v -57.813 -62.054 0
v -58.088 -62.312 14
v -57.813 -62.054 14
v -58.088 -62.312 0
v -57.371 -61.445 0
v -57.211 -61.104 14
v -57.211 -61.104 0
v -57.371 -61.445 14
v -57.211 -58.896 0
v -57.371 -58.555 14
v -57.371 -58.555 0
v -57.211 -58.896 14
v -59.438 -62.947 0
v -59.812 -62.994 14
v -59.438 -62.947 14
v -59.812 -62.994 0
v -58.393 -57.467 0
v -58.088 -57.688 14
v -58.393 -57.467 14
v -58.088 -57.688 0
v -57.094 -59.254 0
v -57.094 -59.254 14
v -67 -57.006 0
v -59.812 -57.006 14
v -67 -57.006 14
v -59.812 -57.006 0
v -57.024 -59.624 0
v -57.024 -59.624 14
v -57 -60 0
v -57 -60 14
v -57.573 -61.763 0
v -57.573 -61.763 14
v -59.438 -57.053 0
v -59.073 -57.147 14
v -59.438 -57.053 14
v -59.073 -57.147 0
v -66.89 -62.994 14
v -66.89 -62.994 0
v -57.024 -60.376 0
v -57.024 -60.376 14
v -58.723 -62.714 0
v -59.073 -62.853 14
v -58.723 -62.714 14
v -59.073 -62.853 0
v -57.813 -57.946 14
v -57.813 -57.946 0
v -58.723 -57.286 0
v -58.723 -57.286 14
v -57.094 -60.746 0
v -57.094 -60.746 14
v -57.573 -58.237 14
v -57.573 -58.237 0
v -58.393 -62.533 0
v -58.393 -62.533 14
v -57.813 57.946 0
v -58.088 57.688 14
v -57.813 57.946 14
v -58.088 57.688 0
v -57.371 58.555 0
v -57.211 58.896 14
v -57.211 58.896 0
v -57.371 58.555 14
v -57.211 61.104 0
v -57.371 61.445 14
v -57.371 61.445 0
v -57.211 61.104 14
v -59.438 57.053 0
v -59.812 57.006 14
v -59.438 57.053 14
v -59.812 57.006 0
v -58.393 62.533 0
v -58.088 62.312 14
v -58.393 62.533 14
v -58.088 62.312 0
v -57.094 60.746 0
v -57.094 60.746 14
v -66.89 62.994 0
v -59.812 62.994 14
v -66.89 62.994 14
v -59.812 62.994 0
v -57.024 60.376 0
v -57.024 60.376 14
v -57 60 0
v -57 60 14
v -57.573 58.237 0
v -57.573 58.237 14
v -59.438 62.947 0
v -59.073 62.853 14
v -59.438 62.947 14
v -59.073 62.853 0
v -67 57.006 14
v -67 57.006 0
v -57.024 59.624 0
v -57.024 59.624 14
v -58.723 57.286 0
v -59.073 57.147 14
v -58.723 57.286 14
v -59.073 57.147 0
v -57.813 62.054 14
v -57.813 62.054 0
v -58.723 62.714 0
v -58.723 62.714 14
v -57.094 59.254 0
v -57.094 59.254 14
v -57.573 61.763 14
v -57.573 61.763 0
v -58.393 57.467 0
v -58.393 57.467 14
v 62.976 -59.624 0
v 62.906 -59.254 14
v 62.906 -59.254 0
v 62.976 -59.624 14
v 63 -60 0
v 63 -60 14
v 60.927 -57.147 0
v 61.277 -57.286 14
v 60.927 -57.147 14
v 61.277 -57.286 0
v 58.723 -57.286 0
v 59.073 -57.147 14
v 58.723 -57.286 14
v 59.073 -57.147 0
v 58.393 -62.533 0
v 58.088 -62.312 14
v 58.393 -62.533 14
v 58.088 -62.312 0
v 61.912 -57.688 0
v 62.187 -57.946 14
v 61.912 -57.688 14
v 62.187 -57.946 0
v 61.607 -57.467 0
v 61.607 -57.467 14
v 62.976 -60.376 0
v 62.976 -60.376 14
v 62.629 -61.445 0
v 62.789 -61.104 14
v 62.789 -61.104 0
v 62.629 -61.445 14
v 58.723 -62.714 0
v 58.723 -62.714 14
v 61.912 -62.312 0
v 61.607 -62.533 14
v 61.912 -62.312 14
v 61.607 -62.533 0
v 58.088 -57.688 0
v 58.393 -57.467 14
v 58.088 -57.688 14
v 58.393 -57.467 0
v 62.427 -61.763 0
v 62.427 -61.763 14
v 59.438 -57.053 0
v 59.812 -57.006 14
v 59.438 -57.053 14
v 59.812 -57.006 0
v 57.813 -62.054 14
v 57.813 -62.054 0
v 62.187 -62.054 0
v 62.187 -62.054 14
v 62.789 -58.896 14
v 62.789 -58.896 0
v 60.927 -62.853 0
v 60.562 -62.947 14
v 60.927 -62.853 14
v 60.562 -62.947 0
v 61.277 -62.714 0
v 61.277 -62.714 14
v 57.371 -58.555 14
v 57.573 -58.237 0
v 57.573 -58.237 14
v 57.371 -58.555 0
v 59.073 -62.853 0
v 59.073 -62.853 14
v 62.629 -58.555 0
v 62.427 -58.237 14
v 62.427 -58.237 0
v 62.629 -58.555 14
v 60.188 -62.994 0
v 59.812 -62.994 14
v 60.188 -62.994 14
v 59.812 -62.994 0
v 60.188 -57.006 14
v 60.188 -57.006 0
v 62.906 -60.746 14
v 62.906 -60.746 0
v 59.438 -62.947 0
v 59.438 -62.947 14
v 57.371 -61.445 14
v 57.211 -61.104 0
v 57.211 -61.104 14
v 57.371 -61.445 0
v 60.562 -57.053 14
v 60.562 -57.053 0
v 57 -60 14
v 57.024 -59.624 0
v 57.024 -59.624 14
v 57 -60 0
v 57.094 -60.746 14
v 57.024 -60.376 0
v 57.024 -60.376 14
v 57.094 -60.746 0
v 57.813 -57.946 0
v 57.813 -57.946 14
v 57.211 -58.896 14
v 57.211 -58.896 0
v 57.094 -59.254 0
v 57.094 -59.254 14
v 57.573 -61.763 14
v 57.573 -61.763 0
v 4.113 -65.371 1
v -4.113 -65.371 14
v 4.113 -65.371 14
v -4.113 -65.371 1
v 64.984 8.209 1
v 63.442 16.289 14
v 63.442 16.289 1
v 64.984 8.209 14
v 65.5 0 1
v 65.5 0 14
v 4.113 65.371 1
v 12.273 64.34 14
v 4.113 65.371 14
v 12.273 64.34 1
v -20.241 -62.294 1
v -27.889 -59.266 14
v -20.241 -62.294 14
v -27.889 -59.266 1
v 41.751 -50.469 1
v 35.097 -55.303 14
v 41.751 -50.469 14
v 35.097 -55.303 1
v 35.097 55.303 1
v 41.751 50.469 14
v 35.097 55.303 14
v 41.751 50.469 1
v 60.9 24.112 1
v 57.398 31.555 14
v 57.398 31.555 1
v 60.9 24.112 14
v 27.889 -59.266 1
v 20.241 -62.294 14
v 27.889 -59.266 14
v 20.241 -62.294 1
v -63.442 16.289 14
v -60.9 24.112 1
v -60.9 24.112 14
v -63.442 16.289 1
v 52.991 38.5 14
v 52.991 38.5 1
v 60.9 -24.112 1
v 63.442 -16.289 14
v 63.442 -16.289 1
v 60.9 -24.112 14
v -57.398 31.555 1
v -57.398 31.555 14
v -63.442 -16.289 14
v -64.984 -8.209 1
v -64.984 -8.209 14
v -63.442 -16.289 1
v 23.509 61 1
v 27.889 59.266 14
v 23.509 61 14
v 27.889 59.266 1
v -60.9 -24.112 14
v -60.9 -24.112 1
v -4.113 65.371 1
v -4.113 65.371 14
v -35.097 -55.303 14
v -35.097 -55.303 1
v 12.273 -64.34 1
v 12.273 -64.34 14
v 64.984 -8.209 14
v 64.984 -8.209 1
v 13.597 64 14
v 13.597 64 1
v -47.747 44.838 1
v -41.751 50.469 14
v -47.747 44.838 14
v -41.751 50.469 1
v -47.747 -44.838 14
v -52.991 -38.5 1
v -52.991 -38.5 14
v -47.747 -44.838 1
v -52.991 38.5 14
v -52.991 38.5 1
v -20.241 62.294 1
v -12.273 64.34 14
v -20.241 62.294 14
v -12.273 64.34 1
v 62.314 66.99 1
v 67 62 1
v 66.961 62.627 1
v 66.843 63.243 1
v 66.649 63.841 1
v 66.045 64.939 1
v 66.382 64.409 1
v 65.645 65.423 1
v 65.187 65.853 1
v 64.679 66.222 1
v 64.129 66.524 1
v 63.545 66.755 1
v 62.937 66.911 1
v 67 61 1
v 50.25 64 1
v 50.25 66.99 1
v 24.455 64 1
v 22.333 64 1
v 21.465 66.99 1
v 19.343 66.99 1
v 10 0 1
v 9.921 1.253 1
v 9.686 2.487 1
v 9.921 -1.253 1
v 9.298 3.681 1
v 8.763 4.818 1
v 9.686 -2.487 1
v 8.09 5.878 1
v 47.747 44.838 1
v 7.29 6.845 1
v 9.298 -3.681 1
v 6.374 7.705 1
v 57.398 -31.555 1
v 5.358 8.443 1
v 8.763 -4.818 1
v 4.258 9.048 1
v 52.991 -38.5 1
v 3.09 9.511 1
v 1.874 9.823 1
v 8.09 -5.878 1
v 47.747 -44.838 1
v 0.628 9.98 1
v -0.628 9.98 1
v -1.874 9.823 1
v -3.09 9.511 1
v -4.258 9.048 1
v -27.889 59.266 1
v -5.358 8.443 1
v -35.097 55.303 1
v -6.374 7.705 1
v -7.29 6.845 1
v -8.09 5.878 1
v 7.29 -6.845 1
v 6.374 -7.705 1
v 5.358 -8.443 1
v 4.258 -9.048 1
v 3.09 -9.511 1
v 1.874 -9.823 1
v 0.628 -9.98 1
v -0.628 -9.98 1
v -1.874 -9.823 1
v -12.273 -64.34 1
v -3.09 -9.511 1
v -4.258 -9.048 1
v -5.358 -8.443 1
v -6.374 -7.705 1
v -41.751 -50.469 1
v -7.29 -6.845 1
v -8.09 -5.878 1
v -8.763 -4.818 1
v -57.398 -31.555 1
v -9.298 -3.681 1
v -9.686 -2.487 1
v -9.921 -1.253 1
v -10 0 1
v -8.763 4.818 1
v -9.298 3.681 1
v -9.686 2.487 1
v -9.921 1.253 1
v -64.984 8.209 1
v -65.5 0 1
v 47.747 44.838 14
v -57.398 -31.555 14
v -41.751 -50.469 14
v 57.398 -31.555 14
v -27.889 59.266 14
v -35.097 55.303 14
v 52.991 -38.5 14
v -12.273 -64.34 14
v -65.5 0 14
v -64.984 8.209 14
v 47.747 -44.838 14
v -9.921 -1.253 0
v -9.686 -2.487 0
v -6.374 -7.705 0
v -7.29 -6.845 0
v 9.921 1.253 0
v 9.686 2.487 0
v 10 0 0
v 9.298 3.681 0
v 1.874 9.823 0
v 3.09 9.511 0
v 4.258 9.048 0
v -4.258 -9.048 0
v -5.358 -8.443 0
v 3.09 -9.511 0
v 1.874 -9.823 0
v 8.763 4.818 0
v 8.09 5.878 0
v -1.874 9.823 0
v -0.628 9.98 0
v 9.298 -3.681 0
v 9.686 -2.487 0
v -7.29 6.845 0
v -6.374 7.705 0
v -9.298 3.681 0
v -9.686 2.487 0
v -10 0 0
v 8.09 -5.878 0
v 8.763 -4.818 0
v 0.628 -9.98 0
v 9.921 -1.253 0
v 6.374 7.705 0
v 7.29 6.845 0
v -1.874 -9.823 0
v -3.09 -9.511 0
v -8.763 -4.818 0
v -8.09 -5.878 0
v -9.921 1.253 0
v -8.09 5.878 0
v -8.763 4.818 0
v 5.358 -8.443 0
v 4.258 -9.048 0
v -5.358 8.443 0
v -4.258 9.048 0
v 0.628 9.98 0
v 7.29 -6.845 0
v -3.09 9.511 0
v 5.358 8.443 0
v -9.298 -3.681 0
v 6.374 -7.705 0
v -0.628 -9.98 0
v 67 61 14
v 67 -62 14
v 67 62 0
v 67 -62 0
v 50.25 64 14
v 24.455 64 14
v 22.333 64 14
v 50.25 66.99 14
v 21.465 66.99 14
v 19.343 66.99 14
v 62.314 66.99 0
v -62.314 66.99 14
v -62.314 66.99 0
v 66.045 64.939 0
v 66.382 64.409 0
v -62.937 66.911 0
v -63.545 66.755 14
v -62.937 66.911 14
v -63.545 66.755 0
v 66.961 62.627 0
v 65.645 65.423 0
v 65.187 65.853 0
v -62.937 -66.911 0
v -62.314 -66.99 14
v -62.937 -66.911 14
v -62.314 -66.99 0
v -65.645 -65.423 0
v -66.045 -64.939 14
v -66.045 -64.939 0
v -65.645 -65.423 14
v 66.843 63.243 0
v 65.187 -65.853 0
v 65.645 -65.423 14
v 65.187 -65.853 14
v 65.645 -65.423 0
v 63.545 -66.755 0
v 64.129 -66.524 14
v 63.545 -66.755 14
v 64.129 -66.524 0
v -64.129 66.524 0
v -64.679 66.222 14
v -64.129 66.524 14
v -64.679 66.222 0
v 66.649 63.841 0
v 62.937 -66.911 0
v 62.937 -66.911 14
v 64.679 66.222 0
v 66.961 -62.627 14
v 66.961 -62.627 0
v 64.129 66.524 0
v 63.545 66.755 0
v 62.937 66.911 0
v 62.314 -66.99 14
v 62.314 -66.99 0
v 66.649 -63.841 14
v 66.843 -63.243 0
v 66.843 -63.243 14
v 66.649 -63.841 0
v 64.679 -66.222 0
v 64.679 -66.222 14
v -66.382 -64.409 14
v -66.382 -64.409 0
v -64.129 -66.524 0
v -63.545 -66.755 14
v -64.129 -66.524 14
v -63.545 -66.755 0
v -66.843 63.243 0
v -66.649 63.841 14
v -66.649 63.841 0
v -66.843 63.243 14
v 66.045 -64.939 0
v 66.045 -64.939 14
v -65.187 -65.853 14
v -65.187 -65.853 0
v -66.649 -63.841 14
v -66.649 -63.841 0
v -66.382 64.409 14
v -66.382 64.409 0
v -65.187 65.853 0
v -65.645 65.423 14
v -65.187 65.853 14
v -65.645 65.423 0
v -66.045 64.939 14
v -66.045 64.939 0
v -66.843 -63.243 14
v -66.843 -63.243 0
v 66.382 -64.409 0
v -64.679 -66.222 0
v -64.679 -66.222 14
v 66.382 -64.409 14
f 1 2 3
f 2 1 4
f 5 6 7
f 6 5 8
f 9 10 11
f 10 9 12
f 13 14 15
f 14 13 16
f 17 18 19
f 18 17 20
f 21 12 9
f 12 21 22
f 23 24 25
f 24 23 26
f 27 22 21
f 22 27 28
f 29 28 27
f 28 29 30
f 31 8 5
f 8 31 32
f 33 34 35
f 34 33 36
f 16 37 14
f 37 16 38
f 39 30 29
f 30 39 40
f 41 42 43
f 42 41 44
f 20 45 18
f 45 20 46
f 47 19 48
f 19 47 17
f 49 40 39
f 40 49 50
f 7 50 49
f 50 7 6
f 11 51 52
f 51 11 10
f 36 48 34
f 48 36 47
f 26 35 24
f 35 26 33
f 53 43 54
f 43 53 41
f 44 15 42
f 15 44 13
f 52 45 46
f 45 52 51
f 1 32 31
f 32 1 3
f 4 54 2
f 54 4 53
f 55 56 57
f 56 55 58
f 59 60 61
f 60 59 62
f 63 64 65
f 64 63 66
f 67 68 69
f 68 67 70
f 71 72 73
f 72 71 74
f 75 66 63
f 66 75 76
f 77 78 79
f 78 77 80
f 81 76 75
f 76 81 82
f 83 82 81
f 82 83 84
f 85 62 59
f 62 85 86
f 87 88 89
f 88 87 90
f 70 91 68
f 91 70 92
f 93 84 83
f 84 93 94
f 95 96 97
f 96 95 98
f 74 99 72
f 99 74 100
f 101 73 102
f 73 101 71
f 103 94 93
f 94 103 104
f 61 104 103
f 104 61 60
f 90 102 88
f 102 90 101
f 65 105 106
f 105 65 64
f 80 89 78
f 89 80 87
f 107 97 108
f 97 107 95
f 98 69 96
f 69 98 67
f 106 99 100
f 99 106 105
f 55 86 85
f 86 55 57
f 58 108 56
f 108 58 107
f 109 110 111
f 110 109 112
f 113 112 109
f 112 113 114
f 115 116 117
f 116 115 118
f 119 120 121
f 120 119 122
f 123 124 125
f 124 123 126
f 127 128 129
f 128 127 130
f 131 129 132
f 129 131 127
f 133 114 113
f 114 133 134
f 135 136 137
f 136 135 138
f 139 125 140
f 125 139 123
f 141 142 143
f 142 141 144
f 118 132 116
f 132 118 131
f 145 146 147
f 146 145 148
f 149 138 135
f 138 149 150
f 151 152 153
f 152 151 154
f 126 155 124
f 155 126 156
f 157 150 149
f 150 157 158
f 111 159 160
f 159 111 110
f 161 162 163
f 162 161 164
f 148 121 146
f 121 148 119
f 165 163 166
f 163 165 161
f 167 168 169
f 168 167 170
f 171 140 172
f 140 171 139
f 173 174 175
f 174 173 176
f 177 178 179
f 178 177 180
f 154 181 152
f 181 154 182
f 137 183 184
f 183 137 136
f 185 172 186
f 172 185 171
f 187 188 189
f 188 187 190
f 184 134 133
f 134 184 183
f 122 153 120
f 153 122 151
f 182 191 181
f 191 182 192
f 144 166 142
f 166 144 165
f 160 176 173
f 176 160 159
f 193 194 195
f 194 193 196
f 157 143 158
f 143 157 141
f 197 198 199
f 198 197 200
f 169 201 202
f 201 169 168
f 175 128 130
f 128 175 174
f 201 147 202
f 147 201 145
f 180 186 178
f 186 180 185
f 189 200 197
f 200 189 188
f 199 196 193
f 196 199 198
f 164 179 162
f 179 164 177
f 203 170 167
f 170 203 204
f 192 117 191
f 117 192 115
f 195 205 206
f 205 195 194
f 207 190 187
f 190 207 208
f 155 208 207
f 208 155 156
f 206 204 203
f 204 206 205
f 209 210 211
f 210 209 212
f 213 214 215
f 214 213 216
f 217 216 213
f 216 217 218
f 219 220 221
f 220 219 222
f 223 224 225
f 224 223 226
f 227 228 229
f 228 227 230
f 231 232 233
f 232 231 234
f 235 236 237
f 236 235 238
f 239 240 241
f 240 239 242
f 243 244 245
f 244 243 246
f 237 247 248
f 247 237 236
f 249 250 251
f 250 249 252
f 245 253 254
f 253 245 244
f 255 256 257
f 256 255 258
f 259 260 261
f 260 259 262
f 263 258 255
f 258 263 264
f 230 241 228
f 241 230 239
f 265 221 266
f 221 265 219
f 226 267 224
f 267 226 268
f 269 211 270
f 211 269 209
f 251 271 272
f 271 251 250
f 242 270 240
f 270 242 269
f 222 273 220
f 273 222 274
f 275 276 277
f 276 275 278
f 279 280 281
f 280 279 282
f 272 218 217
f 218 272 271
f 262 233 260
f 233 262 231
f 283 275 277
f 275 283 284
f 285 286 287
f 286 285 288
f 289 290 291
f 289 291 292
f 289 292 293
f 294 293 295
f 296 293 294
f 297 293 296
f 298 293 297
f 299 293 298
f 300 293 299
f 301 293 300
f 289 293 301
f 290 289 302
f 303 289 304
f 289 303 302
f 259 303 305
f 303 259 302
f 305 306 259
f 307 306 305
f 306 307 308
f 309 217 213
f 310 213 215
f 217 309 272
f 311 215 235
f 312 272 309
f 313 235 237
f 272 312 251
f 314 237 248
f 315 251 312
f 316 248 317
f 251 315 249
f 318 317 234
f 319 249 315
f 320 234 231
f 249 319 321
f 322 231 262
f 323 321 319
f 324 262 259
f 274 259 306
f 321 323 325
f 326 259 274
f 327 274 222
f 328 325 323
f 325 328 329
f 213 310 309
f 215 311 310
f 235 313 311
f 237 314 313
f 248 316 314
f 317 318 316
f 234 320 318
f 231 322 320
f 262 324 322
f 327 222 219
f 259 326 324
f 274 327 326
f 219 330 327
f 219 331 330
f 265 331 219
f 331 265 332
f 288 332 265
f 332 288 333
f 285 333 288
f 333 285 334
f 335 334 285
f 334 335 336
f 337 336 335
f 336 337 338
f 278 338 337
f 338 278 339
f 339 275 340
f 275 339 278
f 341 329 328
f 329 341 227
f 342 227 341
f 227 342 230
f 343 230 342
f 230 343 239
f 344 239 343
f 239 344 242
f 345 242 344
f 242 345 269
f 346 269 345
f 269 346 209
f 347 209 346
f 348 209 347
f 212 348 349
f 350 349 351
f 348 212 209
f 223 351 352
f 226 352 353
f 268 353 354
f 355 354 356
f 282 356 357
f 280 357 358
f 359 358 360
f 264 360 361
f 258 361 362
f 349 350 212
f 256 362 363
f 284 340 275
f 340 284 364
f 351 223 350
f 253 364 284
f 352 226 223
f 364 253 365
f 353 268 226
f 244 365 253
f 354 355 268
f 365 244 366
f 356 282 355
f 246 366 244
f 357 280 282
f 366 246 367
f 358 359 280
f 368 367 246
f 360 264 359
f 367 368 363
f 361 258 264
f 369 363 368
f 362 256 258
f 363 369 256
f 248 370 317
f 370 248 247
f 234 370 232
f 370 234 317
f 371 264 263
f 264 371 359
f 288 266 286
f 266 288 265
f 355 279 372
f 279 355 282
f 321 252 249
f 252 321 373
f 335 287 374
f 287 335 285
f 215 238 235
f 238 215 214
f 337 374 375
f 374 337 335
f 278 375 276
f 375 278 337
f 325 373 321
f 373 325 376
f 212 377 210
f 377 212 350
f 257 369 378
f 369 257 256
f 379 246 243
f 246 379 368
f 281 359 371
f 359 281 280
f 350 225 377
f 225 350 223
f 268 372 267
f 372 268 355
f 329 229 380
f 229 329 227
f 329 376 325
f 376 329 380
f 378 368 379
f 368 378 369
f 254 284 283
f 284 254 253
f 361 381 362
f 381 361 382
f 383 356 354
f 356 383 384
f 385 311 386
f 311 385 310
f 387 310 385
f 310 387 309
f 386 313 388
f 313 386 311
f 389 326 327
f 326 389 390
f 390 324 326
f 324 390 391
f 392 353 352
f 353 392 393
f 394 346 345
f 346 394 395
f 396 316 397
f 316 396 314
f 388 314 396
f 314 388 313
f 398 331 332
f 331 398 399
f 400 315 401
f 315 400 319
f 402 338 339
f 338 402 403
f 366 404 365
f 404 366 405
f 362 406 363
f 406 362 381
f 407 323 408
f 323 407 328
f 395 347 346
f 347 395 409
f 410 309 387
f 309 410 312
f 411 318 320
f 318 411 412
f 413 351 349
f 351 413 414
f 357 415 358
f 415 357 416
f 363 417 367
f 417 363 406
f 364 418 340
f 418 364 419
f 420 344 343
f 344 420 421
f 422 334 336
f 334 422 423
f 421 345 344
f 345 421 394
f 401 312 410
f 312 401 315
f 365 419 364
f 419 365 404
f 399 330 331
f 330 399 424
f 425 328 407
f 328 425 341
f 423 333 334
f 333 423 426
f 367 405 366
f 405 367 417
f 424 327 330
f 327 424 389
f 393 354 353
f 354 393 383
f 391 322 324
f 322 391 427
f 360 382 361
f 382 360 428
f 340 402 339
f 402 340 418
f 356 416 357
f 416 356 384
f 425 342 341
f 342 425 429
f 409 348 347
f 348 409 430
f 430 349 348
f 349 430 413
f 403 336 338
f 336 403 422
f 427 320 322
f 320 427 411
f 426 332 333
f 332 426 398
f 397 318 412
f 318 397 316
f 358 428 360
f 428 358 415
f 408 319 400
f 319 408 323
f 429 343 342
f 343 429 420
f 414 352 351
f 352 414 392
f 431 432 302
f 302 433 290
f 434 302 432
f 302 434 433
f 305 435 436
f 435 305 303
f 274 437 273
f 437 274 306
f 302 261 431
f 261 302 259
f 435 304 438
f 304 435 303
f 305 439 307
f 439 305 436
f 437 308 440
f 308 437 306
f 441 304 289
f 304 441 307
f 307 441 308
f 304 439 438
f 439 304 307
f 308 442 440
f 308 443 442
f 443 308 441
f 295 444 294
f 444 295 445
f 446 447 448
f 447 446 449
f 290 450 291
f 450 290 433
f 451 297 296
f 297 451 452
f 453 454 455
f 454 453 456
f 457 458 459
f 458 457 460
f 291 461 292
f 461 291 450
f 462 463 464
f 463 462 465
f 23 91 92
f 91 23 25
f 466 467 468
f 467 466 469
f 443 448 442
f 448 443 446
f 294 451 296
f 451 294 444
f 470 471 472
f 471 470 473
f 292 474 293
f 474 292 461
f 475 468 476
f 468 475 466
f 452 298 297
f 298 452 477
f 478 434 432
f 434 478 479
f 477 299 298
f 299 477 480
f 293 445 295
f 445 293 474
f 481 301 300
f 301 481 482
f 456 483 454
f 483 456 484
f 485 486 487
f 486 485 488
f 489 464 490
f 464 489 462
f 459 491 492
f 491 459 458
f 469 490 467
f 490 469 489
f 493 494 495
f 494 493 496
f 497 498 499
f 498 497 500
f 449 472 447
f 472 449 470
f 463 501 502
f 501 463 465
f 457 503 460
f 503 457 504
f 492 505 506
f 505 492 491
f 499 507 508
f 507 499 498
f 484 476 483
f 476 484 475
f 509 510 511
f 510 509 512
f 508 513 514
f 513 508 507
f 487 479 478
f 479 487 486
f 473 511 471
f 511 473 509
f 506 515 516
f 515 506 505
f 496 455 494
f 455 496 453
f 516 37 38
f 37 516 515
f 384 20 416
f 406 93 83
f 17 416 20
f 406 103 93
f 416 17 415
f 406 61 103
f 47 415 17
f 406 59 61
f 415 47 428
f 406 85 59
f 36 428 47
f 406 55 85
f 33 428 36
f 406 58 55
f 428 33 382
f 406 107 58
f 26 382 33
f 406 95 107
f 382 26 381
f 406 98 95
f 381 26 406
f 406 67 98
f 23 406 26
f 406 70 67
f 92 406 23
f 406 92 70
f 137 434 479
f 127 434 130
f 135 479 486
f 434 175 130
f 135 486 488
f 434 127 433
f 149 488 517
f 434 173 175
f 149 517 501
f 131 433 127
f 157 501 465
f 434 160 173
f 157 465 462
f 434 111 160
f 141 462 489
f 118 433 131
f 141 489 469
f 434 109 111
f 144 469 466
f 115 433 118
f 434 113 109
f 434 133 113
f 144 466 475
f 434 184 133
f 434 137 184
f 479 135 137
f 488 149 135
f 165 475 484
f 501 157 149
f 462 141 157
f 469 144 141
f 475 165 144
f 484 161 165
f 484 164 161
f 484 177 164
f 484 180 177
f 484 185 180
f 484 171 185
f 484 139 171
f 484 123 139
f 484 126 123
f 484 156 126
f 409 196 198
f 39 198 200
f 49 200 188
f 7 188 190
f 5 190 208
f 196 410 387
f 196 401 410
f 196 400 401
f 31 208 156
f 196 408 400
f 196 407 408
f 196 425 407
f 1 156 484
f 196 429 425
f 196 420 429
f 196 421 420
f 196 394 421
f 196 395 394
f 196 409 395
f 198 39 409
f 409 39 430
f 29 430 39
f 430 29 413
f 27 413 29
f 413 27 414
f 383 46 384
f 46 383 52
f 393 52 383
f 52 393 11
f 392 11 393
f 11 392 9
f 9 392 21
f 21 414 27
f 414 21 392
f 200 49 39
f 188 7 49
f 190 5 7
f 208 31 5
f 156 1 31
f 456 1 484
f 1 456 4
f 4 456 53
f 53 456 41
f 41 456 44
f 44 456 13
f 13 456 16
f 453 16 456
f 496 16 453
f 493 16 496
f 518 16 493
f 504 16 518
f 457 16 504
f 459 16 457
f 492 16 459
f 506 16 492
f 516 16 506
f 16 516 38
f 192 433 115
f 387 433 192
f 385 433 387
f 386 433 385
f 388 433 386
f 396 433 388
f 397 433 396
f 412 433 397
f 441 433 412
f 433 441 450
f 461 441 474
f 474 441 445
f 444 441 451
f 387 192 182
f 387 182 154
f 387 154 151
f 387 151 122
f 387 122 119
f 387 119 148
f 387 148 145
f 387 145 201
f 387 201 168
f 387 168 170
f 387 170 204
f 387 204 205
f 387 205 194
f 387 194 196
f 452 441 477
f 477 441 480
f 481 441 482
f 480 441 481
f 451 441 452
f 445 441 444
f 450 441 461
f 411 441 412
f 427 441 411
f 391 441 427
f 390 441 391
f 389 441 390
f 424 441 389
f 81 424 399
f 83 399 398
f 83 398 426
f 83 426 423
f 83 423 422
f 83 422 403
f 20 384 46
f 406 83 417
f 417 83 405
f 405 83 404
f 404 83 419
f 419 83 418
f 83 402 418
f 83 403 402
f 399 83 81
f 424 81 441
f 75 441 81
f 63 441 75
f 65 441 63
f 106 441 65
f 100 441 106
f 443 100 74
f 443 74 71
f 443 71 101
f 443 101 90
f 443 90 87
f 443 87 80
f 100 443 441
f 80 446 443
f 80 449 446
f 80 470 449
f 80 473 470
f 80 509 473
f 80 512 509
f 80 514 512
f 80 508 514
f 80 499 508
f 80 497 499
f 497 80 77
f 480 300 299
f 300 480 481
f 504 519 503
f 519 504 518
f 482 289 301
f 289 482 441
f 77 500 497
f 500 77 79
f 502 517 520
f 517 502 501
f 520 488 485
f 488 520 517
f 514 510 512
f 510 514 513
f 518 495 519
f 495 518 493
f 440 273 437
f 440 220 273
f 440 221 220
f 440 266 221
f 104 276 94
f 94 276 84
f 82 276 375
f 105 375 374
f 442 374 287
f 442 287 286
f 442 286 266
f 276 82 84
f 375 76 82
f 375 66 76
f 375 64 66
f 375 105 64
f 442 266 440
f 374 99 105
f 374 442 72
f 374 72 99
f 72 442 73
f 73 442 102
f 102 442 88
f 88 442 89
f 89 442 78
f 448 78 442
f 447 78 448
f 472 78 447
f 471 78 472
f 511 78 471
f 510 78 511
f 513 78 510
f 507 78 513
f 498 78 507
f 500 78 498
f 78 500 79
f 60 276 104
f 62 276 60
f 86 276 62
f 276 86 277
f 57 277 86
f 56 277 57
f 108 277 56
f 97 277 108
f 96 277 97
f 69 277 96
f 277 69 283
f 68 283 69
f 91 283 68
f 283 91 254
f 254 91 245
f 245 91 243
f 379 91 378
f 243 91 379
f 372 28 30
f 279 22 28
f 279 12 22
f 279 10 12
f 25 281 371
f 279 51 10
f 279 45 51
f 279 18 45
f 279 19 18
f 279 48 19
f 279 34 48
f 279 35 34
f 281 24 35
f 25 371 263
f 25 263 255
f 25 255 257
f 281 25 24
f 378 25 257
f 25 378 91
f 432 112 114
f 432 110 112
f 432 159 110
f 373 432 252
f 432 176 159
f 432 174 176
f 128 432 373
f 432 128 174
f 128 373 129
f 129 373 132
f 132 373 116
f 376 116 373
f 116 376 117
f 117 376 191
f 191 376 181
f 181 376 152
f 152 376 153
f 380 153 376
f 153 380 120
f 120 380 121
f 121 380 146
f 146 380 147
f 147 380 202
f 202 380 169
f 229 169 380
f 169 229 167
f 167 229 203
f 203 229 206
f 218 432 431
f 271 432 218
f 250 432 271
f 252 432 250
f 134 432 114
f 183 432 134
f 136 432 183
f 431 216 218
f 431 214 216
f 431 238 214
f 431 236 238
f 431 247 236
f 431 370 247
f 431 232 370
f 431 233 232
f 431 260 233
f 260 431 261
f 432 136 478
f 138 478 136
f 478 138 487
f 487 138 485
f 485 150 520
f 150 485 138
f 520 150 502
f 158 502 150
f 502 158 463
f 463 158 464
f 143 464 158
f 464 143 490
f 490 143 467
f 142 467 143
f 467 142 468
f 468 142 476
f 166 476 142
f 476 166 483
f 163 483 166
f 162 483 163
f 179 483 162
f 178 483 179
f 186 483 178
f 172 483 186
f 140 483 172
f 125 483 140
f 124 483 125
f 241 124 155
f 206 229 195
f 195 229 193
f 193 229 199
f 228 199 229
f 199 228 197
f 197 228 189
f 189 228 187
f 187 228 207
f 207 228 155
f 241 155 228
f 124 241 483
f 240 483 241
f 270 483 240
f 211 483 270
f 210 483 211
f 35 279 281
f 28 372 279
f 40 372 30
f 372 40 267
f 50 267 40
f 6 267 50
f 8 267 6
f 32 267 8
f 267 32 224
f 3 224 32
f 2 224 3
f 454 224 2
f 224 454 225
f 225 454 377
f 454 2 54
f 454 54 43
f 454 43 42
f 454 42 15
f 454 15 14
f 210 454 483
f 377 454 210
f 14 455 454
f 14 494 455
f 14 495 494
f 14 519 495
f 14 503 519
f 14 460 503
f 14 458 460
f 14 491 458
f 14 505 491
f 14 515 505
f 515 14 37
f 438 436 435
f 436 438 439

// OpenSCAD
$fn = 50;


difference() {
	union() {
		translate(v = [0, 0, 0]) {
			rotate(a = [0, 0, 0]) {
				hull() {
					translate(v = [-62.0000000000, 62.0000000000, 0]) {
						rotate(a = [0, 0, 0]) {
							translate(v = [0, 0, 0]) {
								rotate(a = [0, 0, 0]) {
									cylinder(h = 14, r = 5);
								}
							}
						}
					}
					translate(v = [62.0000000000, 62.0000000000, 0]) {
						rotate(a = [0, 0, 0]) {
							translate(v = [0, 0, 0]) {
								rotate(a = [0, 0, 0]) {
									cylinder(h = 14, r = 5);
								}
							}
						}
					}
					translate(v = [-62.0000000000, -62.0000000000, 0]) {
						rotate(a = [0, 0, 0]) {
							translate(v = [0, 0, 0]) {
								rotate(a = [0, 0, 0]) {
									cylinder(h = 14, r = 5);
								}
							}
						}
					}
					translate(v = [62.0000000000, -62.0000000000, 0]) {
						rotate(a = [0, 0, 0]) {
							translate(v = [0, 0, 0]) {
								rotate(a = [0, 0, 0]) {
									cylinder(h = 14, r = 5);
								}
							}
						}
					}
				}
			}
		}
	}
	union() {
		translate(v = [-67.5000000000, -60.0000000000, -125]) {
			rotate(a = [0, 0, 0]) {
				hull() {
					translate(v = [7.5000000000, 0, 0]) {
						rotate(a = [0, 0, 0]) {
							translate(v = [0, 0, 0]) {
								rotate(a = [0, 0, 0]) {
									cylinder(h = 250, r = 3.0000000000);
								}
							}
						}
					}
					translate(v = [-7.5000000000, 0, 0]) {
						rotate(a = [0, 0, 0]) {
							translate(v = [0, 0, 0]) {
								rotate(a = [0, 0, 0]) {
									cylinder(h = 250, r = 3.0000000000);
								}
							}
						}
					}
				}
			}
		}
		translate(v = [-67.5000000000, 60.0000000000, -125]) {
			rotate(a = [0, 0, 0]) {
				hull() {
					translate(v = [7.5000000000, 0, 0]) {
						rotate(a = [0, 0, 0]) {
							translate(v = [0, 0, 0]) {
								rotate(a = [0, 0, 0]) {
									cylinder(h = 250, r = 3.0000000000);
								}
							}
						}
					}
					translate(v = [-7.5000000000, 0, 0]) {
						rotate(a = [0, 0, 0]) {
							translate(v = [0, 0, 0]) {
								rotate(a = [0, 0, 0]) {
									cylinder(h = 250, r = 3.0000000000);
								}
							}
						}
					}
				}
			}
		}
		translate(v = [60.0000000000, -60.0000000000, -125.0000000000]) {
			rotate(a = [0, 0, 0]) {
				cylinder(h = 250, r = 3.0000000000);
			}
		}
		translate(v = [0, 0, 1.0000000000]) {
			rotate(a = [0, 0, 0]) {
				cylinder(h = 16, r = 65.5000000000);
			}
		}
		translate(v = [0, 0, -7.0000000000]) {
			rotate(a = [0, 0, 0]) {
				cylinder(h = 14, r = 10.0000000000);
			}
		}
		translate(v = [0.0000000000, 61.0000000000, 1]) {
			rotate(a = [0, 0, 0]) {
				cube(size = [67.0000000000, 3, 16]);
			}
		}
		translate(v = [50.2500000000, 61.0000000000, 1]) {
			rotate(a = [0, 0, 0]) {
				cube(size = [16.7500000000, 6, 16]);
			}
		}
		translate(v = [18.5833333333, 67.7500000000, 1]) {
			rotate(a = [0, 0, -45]) {
				cube(size = [7.5000000000, 1.5000000000, 16]);
			}
		}
	}
}
